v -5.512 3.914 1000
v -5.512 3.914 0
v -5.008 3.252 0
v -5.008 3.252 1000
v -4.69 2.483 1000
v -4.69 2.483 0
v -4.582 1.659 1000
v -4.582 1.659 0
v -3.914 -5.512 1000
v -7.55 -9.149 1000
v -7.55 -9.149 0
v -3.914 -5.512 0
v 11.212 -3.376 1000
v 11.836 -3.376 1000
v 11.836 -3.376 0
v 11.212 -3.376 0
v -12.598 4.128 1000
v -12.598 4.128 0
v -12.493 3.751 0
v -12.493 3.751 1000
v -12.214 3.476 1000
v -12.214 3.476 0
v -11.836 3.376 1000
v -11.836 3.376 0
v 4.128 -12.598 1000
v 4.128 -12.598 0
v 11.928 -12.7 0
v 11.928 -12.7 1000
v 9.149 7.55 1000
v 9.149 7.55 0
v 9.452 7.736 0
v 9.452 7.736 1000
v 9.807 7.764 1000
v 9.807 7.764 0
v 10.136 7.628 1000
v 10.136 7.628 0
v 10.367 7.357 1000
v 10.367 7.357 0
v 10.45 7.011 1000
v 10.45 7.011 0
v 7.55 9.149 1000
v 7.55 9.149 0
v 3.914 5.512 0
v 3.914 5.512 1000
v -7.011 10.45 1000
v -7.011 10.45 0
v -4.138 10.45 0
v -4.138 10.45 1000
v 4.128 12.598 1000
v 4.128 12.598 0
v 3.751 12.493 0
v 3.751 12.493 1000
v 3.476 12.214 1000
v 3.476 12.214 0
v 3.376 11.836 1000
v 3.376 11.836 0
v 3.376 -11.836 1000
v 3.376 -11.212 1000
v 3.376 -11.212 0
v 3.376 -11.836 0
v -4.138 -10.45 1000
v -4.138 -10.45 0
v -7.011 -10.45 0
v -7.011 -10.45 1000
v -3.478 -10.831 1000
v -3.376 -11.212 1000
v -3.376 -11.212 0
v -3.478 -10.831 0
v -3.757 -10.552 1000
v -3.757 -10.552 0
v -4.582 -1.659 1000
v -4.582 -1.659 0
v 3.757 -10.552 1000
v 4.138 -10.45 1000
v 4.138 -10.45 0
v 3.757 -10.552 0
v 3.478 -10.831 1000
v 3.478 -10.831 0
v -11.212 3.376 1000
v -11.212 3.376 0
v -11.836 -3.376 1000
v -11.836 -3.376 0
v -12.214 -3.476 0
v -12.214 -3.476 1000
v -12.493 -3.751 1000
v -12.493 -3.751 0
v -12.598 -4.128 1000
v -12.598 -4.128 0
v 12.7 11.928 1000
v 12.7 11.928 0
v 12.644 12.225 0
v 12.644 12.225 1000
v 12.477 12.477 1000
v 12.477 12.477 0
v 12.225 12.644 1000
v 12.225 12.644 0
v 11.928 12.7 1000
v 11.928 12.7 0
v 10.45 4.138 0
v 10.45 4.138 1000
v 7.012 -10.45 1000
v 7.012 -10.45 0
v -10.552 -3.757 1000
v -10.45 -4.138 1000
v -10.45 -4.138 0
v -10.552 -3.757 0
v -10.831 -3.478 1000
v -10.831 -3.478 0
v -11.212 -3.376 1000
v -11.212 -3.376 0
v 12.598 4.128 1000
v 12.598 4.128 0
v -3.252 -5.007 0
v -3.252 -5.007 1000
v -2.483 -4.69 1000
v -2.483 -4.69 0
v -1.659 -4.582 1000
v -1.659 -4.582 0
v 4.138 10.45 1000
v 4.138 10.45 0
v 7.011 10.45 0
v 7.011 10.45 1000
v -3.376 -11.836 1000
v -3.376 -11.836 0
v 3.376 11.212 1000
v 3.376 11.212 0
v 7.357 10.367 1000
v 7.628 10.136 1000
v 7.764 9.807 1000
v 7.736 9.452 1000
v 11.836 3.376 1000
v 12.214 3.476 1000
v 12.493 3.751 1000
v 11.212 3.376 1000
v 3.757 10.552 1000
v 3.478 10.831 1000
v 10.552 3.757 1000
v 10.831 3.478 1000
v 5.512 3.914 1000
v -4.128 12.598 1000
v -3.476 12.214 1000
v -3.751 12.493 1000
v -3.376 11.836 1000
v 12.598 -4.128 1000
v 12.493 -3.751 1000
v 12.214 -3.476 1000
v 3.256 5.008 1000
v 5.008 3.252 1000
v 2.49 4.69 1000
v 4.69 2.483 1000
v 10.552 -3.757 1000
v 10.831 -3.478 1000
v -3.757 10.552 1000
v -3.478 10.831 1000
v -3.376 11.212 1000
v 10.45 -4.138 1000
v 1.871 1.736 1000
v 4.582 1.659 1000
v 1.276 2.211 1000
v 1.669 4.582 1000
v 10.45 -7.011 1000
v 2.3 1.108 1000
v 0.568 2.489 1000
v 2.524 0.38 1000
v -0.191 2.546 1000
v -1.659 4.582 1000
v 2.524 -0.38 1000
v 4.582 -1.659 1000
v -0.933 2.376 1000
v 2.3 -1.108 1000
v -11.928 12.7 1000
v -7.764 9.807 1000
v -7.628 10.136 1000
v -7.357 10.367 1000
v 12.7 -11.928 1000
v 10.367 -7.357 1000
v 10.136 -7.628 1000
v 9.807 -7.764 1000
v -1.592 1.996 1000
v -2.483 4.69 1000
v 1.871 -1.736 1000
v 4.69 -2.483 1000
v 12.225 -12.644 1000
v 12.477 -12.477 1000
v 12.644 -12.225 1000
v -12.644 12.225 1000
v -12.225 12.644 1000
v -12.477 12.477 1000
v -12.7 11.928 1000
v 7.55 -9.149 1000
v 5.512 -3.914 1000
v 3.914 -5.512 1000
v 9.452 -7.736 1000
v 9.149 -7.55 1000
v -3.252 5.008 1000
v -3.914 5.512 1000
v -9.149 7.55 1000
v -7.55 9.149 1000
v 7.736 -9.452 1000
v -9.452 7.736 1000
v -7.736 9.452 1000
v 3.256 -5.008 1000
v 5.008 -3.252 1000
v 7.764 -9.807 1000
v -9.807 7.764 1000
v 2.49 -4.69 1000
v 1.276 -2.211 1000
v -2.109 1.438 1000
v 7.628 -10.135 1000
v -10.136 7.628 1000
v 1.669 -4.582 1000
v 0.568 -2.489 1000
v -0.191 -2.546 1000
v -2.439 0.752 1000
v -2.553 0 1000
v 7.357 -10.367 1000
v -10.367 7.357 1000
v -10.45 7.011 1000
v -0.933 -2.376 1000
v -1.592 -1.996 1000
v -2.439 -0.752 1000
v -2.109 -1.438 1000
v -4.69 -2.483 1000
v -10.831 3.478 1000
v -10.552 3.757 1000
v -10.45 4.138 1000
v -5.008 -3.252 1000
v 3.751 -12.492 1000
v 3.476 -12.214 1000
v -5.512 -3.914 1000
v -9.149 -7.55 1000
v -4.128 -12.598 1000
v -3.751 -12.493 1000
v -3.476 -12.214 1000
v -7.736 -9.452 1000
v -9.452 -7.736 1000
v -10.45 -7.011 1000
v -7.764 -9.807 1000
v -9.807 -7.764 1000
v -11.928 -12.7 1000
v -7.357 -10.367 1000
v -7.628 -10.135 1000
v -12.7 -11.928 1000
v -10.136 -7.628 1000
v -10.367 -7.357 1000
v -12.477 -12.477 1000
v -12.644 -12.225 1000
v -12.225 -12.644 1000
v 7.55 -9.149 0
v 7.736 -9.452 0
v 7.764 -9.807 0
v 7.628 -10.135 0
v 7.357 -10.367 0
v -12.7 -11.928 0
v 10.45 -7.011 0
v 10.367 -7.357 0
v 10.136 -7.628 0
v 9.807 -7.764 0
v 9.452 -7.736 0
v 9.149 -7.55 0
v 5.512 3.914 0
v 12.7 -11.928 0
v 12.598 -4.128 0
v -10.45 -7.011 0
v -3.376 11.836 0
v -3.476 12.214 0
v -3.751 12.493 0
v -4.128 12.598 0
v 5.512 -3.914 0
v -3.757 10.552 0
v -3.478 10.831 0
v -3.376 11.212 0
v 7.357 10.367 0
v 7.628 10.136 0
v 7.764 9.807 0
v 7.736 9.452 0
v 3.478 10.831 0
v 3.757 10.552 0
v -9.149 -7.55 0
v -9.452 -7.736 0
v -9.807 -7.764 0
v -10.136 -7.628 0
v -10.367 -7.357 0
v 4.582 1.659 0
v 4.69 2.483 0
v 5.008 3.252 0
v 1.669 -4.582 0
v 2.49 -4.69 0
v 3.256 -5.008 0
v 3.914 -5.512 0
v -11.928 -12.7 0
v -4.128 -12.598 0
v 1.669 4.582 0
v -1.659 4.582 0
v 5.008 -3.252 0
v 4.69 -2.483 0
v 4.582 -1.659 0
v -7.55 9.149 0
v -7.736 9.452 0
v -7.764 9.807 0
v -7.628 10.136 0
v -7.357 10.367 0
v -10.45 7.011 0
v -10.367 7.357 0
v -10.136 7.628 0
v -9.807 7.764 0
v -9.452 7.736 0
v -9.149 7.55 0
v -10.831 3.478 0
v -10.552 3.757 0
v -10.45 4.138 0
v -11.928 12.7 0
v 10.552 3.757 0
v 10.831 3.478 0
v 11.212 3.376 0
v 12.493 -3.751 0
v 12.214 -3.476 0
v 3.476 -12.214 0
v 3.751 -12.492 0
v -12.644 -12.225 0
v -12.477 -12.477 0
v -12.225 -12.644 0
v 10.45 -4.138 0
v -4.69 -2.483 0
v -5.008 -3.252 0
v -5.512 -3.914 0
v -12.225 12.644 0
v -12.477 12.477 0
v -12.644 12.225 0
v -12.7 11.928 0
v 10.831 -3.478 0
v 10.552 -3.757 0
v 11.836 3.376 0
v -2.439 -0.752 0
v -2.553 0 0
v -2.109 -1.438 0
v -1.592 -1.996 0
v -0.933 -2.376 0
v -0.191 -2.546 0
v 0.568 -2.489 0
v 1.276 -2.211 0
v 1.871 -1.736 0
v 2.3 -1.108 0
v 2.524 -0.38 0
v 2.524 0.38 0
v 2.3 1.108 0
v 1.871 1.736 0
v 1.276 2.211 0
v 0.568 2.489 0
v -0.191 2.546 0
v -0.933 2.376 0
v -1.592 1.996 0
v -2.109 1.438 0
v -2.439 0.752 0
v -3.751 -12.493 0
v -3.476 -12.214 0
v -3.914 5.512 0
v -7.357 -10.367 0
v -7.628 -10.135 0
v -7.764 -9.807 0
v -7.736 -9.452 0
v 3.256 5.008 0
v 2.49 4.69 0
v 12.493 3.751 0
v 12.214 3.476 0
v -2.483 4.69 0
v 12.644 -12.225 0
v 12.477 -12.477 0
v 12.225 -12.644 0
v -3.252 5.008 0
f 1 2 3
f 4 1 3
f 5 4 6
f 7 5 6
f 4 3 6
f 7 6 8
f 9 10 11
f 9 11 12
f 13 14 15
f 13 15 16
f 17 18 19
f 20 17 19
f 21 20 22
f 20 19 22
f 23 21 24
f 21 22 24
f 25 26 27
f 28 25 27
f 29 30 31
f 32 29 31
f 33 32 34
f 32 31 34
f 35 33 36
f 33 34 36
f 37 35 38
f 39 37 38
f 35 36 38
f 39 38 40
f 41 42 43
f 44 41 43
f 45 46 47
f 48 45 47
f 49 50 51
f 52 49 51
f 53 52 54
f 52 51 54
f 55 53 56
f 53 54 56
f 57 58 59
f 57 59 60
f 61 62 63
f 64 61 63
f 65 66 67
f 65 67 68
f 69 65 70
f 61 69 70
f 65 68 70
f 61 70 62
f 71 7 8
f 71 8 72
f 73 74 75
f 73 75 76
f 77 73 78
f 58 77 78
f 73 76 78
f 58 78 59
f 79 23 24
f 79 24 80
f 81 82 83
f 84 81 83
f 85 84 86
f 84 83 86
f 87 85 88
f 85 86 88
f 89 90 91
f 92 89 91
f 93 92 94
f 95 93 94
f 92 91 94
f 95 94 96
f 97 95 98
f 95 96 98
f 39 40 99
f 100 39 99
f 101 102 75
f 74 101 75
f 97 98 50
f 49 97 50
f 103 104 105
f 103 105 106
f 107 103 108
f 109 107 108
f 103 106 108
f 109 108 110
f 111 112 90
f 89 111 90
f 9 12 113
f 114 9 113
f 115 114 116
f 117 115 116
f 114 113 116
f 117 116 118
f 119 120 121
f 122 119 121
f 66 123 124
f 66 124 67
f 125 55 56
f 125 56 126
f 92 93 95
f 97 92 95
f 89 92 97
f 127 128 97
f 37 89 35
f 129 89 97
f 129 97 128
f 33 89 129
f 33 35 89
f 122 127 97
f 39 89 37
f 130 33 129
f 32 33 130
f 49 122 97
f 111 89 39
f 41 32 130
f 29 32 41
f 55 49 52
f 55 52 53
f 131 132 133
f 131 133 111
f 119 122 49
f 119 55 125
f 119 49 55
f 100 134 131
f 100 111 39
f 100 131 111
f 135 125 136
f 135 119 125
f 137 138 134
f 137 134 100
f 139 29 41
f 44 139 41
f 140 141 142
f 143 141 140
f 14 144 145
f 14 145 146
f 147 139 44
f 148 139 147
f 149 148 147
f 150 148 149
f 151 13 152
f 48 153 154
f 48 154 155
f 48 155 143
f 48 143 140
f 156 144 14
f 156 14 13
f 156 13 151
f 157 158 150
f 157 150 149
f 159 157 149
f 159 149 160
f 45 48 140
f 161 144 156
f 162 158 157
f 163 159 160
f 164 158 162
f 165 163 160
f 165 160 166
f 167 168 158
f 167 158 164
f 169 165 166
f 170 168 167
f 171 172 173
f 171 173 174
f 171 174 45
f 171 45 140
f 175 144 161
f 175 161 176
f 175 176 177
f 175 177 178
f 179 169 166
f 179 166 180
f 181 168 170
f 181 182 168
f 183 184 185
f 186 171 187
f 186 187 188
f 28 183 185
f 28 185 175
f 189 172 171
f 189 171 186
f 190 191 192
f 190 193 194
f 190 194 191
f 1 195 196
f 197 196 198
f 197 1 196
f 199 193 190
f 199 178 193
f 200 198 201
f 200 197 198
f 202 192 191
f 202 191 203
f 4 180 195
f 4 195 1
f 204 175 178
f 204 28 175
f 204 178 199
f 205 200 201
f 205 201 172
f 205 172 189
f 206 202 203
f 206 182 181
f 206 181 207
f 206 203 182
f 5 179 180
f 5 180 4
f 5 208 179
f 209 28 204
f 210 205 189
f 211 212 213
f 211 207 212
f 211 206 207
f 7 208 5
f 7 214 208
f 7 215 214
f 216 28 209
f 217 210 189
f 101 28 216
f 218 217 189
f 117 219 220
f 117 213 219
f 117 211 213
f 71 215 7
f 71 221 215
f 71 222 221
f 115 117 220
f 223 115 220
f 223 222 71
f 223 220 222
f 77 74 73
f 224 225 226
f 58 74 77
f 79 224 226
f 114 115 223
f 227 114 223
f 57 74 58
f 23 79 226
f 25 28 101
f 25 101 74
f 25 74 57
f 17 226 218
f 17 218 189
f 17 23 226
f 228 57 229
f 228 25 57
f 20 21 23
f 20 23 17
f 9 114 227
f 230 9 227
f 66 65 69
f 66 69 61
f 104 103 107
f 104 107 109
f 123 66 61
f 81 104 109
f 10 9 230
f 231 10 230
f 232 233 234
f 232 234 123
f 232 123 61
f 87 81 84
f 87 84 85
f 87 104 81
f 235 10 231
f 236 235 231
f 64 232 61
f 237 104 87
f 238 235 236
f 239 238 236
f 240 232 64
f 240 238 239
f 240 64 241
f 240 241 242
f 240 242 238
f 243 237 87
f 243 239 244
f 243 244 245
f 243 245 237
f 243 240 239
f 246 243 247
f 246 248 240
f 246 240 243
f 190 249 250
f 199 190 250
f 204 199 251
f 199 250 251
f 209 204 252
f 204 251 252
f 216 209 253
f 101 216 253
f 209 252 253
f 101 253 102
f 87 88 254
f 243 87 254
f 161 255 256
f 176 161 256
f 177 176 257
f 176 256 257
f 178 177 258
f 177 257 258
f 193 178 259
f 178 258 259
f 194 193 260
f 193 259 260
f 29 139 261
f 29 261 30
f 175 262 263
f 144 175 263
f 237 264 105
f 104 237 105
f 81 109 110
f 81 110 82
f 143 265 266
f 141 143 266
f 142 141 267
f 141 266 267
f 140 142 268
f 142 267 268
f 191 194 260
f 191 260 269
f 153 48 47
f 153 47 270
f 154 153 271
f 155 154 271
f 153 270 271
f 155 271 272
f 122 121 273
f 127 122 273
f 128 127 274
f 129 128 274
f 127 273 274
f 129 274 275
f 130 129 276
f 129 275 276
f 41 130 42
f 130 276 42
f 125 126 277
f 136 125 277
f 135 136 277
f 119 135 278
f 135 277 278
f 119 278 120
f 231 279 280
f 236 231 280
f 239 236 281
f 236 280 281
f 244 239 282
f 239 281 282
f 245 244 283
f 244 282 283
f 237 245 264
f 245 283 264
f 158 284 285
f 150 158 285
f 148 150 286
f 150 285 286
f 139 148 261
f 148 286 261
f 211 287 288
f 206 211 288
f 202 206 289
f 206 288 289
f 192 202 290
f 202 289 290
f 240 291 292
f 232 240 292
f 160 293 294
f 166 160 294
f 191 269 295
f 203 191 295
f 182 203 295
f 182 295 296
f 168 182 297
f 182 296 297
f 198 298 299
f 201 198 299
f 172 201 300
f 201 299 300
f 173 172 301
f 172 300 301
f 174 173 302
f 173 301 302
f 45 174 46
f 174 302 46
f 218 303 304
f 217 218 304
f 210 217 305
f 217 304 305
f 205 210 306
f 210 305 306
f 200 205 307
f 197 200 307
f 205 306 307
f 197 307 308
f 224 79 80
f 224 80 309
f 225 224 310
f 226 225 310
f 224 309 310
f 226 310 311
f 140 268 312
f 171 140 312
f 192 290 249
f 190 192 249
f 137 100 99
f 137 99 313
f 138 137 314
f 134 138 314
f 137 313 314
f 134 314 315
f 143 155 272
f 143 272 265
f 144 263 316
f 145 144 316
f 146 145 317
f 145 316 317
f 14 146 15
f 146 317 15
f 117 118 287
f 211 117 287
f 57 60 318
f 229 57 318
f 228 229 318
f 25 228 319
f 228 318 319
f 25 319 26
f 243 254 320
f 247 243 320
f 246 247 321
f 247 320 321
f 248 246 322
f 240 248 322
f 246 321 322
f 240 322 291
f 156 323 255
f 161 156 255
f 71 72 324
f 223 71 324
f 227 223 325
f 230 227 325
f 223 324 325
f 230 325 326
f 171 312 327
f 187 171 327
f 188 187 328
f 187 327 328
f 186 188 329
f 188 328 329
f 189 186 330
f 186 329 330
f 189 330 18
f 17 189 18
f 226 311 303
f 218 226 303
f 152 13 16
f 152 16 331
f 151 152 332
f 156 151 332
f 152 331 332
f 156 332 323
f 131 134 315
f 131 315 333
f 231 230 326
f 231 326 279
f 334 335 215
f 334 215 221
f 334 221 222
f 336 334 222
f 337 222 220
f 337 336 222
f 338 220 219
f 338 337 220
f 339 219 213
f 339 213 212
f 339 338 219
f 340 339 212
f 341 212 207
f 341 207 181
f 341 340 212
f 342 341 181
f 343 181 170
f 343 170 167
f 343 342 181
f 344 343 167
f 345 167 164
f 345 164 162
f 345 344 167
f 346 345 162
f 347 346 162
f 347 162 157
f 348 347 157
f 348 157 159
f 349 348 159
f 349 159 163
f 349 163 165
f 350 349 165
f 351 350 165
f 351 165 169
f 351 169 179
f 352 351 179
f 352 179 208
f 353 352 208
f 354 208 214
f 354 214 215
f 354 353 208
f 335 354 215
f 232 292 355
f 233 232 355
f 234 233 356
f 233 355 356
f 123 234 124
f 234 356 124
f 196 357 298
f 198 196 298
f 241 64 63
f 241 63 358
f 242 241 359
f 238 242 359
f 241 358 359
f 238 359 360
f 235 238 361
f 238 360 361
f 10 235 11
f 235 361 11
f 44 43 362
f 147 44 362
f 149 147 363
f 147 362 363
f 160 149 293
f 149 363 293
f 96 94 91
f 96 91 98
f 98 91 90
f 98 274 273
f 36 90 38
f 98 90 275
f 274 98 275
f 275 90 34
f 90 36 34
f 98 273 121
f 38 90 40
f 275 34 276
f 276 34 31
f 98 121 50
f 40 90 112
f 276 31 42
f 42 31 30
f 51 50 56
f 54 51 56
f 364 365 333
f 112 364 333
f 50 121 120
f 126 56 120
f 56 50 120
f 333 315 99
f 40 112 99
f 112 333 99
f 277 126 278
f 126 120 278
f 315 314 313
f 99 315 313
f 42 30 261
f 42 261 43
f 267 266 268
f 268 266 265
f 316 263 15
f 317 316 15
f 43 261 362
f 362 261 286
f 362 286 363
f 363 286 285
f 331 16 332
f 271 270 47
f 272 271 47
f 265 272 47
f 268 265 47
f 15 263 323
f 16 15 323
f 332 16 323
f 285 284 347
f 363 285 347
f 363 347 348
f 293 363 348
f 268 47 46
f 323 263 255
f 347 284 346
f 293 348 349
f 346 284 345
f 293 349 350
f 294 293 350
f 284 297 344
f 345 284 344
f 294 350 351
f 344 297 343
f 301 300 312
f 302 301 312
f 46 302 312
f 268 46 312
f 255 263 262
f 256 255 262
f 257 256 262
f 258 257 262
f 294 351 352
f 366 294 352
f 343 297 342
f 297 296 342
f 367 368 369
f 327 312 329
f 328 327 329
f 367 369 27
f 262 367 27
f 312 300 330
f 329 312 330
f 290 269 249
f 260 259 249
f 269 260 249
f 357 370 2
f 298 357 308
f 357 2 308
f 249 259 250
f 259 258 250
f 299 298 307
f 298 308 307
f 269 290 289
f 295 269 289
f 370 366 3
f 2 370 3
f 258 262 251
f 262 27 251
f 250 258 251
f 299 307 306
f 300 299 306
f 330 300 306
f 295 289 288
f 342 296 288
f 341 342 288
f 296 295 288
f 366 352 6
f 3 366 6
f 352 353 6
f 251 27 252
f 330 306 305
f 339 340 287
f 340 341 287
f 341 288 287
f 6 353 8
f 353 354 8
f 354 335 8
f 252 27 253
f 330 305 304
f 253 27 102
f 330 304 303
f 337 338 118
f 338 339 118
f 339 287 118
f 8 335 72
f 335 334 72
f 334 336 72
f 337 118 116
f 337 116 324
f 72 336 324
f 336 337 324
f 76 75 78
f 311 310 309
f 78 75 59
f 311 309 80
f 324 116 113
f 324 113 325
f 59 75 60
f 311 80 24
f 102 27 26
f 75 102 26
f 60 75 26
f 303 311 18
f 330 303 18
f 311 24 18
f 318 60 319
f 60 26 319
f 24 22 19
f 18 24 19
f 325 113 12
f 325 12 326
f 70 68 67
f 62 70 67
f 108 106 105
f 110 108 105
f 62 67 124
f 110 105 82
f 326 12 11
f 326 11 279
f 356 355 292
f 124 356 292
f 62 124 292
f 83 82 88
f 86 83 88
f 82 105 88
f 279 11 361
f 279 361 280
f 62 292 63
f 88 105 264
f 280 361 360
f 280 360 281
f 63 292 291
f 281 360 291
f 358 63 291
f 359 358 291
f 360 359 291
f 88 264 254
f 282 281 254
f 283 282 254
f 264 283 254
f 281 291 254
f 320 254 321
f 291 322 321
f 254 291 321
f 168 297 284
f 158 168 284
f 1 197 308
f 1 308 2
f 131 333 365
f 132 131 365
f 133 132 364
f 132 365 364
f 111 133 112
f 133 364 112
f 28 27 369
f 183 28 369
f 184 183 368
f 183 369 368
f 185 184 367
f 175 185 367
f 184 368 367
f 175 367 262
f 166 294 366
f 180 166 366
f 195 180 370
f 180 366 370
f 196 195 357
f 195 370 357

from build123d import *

# Parameters (mm, degrees)
SKETCH1_R           = 2.5527
BOSS_EXTRUDE1_DEPTH = 1000


with BuildPart() as part:
    # Sketch1 → Boss-Extrude1 (new body)
    with BuildSketch(Plane(origin=(0, 0, 0), x_dir=(-1, 0, 0), z_dir=(0, 0, 1))):
        with BuildLine():
            Line((12.7, -11.928012126), (12.597888134, -4.12768572))
            ThreePointArc((12.597888134, -4.12768572), (12.37123073, -3.595329652), (11.835953416, -3.375659992))
            Line((11.835953416, -3.375659992), (11.211638876, -3.375659992))
            ThreePointArc((11.211638876, -3.375659992), (10.672823509, -3.598844625), (10.449638876, -4.137659992))
            Line((10.449638876, -4.137659992), (10.449638876, -7.011443668))
            ThreePointArc((10.449638876, -7.011443668), (9.979243652, -7.715439871), (9.148823509, -7.550259035))
            Line((9.148823509, -7.550259035), (5.512177529, -3.913613055))
            ThreePointArc((5.512177529, -3.913613055), (4.823848516, -2.878310338), (4.582238867, -1.658772178))
            Line((4.582238867, -1.658772178), (4.582238867, 1.658772182))
            ThreePointArc((4.582238867, 1.658772182), (4.823848516, 2.878310345), (5.512177531, 3.913613063))
            Line((5.512177531, 3.913613063), (9.148823511, 7.550259043))
            ThreePointArc((9.148823511, 7.550259043), (9.979243654, 7.71543988), (10.449638878, 7.011443676))
            Line((10.449638878, 7.011443676), (10.449638878, 4.13766))
            ThreePointArc((10.449638878, 4.13766), (10.672823511, 3.598844633), (11.211638878, 3.37566))
            Line((11.211638878, 3.37566), (11.835953418, 3.37566))
            ThreePointArc((11.835953418, 3.37566), (12.37123073, 3.595329661), (12.597888134, 4.127685728))
            Line((12.597888134, 4.127685728), (12.7, 11.928012134))
            ThreePointArc((12.7, 11.928012134), (12.476881698, 12.476881702), (11.928012128, 12.7))
            Line((11.928012128, 12.7), (4.127685722, 12.597888134))
            ThreePointArc((4.127685722, 12.597888134), (3.595329654, 12.37123073), (3.375659994, 11.835953416))
            Line((3.375659994, 11.835953416), (3.375659994, 11.211638876))
            ThreePointArc((3.375659994, 11.211638876), (3.598844627, 10.672823509), (4.137659994, 10.449638876))
            Line((4.137659994, 10.449638876), (7.01144367, 10.449638876))
            ThreePointArc((7.01144367, 10.449638876), (7.715461217, 9.979192126), (7.550180161, 9.148744642))
            Line((7.550180161, 9.148744642), (3.913534181, 5.512098662))
            ThreePointArc((3.913534181, 5.512098662), (2.878231464, 4.823769649), (1.658693304, 4.58216))
            Line((1.658693304, 4.58216), (-1.668625226, 4.58216))
            ThreePointArc((-1.668625226, 4.58216), (-2.883645124, 4.823842484), (-3.913689257, 5.51209597))
            Line((-3.913689257, 5.51209597), (-7.55033792, 9.148744633))
            ThreePointArc((-7.55033792, 9.148744633), (-7.715518756, 9.979164775), (-7.011522552, 10.44956))
            Line((-7.011522552, 10.44956), (-4.137738876, 10.44956))
            ThreePointArc((-4.137738876, 10.44956), (-3.598923509, 10.672744633), (-3.375738876, 11.21156))
            Line((-3.375738876, 11.21156), (-3.375738876, 11.83587454))
            ThreePointArc((-3.375738876, 11.83587454), (-3.595408537, 12.371151853), (-4.127764605, 12.597809257))
            Line((-4.127764605, 12.597809257), (-11.928091011, 12.699921124))
            ThreePointArc((-11.928091011, 12.699921124), (-12.47688065, 12.476801773), (-12.7, 11.928012134))
            Line((-12.7, 11.928012134), (-12.597888134, 4.127685728))
            ThreePointArc((-12.597888134, 4.127685728), (-12.37123073, 3.59532966), (-11.835953416, 3.37566))
            Line((-11.835953416, 3.37566), (-11.211638876, 3.37566))
            ThreePointArc((-11.211638876, 3.37566), (-10.672823509, 3.598844633), (-10.449638876, 4.13766))
            Line((-10.449638876, 4.13766), (-10.449638876, 7.011443676))
            ThreePointArc((-10.449638876, 7.011443676), (-9.979243652, 7.71543988), (-9.148823509, 7.550259043))
            Line((-9.148823509, 7.550259043), (-5.512177529, 3.913613063))
            ThreePointArc((-5.512177529, 3.913613063), (-4.823848515, 2.878310347), (-4.582238866, 1.658772187))
            Line((-4.582238866, 1.658772187), (-4.582238866, -1.658772174))
            ThreePointArc((-4.582238866, -1.658772174), (-4.823848515, -2.878310336), (-5.512177529, -3.913613055))
            Line((-5.512177529, -3.913613055), (-9.148823509, -7.550259035))
            ThreePointArc((-9.148823509, -7.550259035), (-9.979243652, -7.715439871), (-10.449638876, -7.011443668))
            Line((-10.449638876, -7.011443668), (-10.449638876, -4.137659992))
            ThreePointArc((-10.449638876, -4.137659992), (-10.672823509, -3.598844625), (-11.211638876, -3.375659992))
            Line((-11.211638876, -3.375659992), (-11.835953416, -3.375659992))
            ThreePointArc((-11.835953416, -3.375659992), (-12.37123073, -3.595329652), (-12.597888134, -4.12768572))
            Line((-12.597888134, -4.12768572), (-12.7, -11.928012126))
            ThreePointArc((-12.7, -11.928012126), (-12.476881704, -12.476881697), (-11.928012136, -12.7))
            Line((-11.928012136, -12.7), (-4.12768573, -12.597888134))
            ThreePointArc((-4.12768573, -12.597888134), (-3.595329662, -12.37123073), (-3.375660002, -11.835953416))
            Line((-3.375660002, -11.835953416), (-3.375660002, -11.211638876))
            ThreePointArc((-3.375660002, -11.211638876), (-3.598844634, -10.672823509), (-4.137660002, -10.449638876))
            Line((-4.137660002, -10.449638876), (-7.011443678, -10.449638876))
            ThreePointArc((-7.011443678, -10.449638876), (-7.715439881, -9.979243652), (-7.550259045, -9.148823509))
            Line((-7.550259045, -9.148823509), (-3.913610382, -5.512174846))
            ThreePointArc((-3.913610382, -5.512174846), (-2.883566249, -4.823921361), (-1.668546352, -4.582238876))
            Line((-1.668546352, -4.582238876), (1.658772179, -4.582238876))
            ThreePointArc((1.658772179, -4.582238876), (2.878310341, -4.823848525), (3.913613059, -5.51217754))
            Line((3.913613059, -5.51217754), (7.550259039, -9.14882352))
            ThreePointArc((7.550259039, -9.14882352), (7.715439864, -9.979243654), (7.011443672, -10.449638876))
            Line((7.011443672, -10.449638876), (4.137659996, -10.449638876))
            ThreePointArc((4.137659996, -10.449638876), (3.598844629, -10.672823509), (3.375659996, -11.211638876))
            Line((3.375659996, -11.211638876), (3.375659996, -11.835953416))
            ThreePointArc((3.375659996, -11.835953416), (3.595329656, -12.37123073), (4.127685724, -12.597888134))
            Line((4.127685724, -12.597888134), (11.92801213, -12.7))
            ThreePointArc((11.92801213, -12.7), (12.476881702, -12.476881699), (12.7, -11.928012126))
        make_face()
        Circle(SKETCH1_R, mode=Mode.SUBTRACT)
    extrude(amount=BOSS_EXTRUDE1_DEPTH)


solid = part.part
